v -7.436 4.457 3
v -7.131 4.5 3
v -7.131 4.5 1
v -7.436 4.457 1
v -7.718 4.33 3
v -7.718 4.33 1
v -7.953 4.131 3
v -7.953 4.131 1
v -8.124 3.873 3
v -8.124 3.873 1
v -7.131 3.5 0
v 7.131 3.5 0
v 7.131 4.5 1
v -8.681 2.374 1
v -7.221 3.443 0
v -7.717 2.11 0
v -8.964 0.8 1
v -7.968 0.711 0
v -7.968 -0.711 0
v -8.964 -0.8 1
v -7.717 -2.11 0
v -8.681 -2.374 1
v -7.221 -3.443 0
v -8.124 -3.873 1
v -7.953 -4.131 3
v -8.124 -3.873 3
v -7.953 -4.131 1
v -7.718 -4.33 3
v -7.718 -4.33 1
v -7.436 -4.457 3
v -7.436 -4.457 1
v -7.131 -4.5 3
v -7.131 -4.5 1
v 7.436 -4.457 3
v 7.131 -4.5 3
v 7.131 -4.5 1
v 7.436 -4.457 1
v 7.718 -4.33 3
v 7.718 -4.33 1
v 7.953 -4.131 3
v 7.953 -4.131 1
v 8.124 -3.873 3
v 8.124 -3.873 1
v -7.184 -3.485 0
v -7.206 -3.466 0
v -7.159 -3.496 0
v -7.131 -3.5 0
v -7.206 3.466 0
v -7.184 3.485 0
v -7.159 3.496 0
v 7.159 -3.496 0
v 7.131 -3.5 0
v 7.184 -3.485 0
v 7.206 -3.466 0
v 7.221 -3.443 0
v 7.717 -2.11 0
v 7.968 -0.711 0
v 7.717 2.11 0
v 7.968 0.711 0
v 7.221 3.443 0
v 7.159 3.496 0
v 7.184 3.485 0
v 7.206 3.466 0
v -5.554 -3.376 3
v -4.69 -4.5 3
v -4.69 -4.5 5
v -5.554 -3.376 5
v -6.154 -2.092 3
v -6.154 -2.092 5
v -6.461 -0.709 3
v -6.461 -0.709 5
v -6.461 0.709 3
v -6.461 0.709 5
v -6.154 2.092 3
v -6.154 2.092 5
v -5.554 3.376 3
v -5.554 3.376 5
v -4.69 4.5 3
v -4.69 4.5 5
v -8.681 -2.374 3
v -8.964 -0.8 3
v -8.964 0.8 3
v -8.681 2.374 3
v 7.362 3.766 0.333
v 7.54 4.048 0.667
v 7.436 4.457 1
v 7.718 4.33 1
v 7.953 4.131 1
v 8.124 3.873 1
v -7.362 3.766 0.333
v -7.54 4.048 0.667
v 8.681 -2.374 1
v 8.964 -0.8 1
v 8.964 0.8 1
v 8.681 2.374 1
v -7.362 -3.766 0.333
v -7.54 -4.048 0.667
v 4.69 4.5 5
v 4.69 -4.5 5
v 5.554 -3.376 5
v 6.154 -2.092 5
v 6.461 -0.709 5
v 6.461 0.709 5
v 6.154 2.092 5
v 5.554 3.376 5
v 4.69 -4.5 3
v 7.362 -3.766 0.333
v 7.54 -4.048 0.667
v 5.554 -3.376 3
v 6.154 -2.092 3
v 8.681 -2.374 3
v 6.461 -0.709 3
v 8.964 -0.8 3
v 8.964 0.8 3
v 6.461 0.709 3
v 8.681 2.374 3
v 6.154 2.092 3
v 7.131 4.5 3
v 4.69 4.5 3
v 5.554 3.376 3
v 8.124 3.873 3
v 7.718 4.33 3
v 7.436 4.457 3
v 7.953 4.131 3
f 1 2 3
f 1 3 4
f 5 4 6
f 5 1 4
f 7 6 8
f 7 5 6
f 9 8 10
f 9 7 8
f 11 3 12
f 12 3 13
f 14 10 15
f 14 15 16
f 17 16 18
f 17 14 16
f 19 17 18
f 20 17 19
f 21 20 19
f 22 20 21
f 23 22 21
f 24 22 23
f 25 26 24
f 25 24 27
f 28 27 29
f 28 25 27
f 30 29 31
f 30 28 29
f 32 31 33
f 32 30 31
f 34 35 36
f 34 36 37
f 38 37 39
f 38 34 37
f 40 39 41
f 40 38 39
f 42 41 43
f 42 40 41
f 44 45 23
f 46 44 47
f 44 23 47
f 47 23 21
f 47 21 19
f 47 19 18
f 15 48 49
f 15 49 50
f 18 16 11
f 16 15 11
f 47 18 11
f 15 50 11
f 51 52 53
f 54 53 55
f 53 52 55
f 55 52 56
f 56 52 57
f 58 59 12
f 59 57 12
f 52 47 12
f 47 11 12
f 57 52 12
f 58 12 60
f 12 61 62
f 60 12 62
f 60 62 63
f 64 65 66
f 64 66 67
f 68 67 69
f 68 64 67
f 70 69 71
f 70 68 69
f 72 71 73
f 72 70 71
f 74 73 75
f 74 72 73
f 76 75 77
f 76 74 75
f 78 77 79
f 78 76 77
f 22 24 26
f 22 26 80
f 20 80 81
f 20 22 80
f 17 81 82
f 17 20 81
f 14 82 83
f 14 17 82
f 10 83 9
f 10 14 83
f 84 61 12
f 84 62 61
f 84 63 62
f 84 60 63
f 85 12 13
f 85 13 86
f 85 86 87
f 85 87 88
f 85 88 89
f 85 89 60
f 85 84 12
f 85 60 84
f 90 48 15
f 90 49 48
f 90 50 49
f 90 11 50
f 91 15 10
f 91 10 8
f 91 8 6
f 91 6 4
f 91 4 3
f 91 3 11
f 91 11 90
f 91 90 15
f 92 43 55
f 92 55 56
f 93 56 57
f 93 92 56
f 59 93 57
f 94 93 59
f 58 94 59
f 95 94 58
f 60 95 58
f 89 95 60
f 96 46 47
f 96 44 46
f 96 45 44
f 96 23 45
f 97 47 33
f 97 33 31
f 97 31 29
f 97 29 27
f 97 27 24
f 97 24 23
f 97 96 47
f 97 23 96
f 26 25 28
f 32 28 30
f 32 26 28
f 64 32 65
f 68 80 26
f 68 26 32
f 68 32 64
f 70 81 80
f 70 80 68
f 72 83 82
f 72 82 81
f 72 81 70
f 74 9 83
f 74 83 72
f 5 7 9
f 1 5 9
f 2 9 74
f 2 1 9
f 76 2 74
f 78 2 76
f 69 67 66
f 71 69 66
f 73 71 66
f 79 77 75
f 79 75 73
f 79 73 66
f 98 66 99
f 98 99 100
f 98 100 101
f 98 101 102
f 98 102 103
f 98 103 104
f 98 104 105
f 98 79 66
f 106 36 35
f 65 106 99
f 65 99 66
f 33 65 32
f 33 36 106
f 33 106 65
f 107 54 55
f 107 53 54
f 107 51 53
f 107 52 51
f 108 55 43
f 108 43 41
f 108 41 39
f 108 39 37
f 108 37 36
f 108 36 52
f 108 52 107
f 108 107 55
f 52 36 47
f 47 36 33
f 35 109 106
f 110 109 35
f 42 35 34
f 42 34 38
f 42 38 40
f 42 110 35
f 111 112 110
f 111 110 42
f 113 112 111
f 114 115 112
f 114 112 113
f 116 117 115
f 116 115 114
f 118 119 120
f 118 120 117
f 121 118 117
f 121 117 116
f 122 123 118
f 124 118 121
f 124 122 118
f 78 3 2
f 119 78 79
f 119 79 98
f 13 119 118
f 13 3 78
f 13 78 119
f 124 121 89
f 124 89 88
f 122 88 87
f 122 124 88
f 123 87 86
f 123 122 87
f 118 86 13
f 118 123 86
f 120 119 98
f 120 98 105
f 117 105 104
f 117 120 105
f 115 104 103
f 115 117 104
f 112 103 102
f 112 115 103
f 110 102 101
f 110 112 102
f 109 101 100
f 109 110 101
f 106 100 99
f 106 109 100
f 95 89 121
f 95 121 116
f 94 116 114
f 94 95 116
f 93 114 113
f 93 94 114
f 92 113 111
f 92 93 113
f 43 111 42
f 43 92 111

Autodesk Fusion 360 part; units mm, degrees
sketch "Twist-Lock2 lock" plane through (0, 0, 0) normal (0, 0, 1) x (1, 0, 0)
  line L0 (7.7942, -4.5) -> (-7.7942, -4.5)
  line L1 (-7.7942, 4.5) -> (7.7942, 4.5)
  arc A0 (-7.7942, 4.5) -> (-7.7942, -4.5) centre (0, 0) ccw
  arc A1 (7.7942, -4.5) -> (7.7942, 4.5) centre (0, 0) ccw
  arc A2 (-4.6904, 4.5) -> (-4.6904, -4.5) centre (0, 0) ccw
  arc A3 (4.6904, -4.5) -> (4.6904, 4.5) centre (0, 0) ccw
sketch "Twist-Lock2 hole" plane through (0, 0, 0) normal (0, 0, 1) x (1, 0, 0)
  arc A0 (-8.093, 3.9375) -> (-8.093, -3.9375) centre (0, 0) ccw
  arc A1 (8.093, -3.9375) -> (8.093, 3.9375) centre (0, 0) ccw
  arc A2 (4.4192, 4.7667) -> (-4.4192, 4.7667) centre (0, 0) ccw
  arc A3 (-4.4192, -4.7667) -> (4.4192, -4.7667) centre (0, 0) ccw
  line L0 (7.1937, 4.5) -> (5.099, 4.5)
  line L1 (-5.099, 4.5) -> (-7.1937, 4.5)
  line L2 (-7.1937, -4.5) -> (-5.099, -4.5)
  line L3 (5.099, -4.5) -> (7.1937, -4.5)
  arc A4 (-5.099, 4.5) -> (-4.4192, 4.7667) centre (-5.099, 5.5) ccw
  arc A5 (-7.1937, 4.5) -> (-8.093, 3.9375) centre (-7.1937, 3.5) ccw
  arc A6 (-8.093, -3.9375) -> (-7.1937, -4.5) centre (-7.1937, -3.5) ccw
  arc A7 (-4.4192, -4.7667) -> (-5.099, -4.5) centre (-5.099, -5.5) ccw
  arc A8 (5.099, -4.5) -> (4.4192, -4.7667) centre (5.099, -5.5) ccw
  arc A9 (7.1937, -4.5) -> (8.093, -3.9375) centre (7.1937, -3.5) ccw
  arc A10 (8.093, 3.9375) -> (7.1937, 4.5) centre (7.1937, 3.5) ccw
  arc A11 (4.4192, 4.7667) -> (5.099, 4.5) centre (5.099, 5.5) ccw
  dimension "d26" = 1
extrude "Extrude1" add sketch "Twist-Lock2 lock" along normal blind 3
extrude "Extrude2" add sketch "Twist-Lock2 lock" along normal blind 5 contours L0 L1 A2 A3
fillet "Fillet1" radius 1.1 4 edges at (7.7942, -4.5, 1.5) (-7.7942, -4.5, 1.5) (-7.7942, 4.5, 1.5) (7.7942, 4.5, 1.5)
chamfer "Chamfer1" distance 1 angle 45 8 edges at (-7.718, -4.3303, 0) (-9, 0, 0) (-7.718, 4.3303, 0) (0, 4.5, 0) (7.718, 4.3303, 0) (9, 0, 0) (7.718, -4.3303, 0) (0, -4.5, 0)
equation "Plate_thickness = 2 mm"
equation "Lock_thickness = 3 mm"
equation "d7 = Lock_thickness"
equation "d9 = Lock_thickness + Plate_thickness"
